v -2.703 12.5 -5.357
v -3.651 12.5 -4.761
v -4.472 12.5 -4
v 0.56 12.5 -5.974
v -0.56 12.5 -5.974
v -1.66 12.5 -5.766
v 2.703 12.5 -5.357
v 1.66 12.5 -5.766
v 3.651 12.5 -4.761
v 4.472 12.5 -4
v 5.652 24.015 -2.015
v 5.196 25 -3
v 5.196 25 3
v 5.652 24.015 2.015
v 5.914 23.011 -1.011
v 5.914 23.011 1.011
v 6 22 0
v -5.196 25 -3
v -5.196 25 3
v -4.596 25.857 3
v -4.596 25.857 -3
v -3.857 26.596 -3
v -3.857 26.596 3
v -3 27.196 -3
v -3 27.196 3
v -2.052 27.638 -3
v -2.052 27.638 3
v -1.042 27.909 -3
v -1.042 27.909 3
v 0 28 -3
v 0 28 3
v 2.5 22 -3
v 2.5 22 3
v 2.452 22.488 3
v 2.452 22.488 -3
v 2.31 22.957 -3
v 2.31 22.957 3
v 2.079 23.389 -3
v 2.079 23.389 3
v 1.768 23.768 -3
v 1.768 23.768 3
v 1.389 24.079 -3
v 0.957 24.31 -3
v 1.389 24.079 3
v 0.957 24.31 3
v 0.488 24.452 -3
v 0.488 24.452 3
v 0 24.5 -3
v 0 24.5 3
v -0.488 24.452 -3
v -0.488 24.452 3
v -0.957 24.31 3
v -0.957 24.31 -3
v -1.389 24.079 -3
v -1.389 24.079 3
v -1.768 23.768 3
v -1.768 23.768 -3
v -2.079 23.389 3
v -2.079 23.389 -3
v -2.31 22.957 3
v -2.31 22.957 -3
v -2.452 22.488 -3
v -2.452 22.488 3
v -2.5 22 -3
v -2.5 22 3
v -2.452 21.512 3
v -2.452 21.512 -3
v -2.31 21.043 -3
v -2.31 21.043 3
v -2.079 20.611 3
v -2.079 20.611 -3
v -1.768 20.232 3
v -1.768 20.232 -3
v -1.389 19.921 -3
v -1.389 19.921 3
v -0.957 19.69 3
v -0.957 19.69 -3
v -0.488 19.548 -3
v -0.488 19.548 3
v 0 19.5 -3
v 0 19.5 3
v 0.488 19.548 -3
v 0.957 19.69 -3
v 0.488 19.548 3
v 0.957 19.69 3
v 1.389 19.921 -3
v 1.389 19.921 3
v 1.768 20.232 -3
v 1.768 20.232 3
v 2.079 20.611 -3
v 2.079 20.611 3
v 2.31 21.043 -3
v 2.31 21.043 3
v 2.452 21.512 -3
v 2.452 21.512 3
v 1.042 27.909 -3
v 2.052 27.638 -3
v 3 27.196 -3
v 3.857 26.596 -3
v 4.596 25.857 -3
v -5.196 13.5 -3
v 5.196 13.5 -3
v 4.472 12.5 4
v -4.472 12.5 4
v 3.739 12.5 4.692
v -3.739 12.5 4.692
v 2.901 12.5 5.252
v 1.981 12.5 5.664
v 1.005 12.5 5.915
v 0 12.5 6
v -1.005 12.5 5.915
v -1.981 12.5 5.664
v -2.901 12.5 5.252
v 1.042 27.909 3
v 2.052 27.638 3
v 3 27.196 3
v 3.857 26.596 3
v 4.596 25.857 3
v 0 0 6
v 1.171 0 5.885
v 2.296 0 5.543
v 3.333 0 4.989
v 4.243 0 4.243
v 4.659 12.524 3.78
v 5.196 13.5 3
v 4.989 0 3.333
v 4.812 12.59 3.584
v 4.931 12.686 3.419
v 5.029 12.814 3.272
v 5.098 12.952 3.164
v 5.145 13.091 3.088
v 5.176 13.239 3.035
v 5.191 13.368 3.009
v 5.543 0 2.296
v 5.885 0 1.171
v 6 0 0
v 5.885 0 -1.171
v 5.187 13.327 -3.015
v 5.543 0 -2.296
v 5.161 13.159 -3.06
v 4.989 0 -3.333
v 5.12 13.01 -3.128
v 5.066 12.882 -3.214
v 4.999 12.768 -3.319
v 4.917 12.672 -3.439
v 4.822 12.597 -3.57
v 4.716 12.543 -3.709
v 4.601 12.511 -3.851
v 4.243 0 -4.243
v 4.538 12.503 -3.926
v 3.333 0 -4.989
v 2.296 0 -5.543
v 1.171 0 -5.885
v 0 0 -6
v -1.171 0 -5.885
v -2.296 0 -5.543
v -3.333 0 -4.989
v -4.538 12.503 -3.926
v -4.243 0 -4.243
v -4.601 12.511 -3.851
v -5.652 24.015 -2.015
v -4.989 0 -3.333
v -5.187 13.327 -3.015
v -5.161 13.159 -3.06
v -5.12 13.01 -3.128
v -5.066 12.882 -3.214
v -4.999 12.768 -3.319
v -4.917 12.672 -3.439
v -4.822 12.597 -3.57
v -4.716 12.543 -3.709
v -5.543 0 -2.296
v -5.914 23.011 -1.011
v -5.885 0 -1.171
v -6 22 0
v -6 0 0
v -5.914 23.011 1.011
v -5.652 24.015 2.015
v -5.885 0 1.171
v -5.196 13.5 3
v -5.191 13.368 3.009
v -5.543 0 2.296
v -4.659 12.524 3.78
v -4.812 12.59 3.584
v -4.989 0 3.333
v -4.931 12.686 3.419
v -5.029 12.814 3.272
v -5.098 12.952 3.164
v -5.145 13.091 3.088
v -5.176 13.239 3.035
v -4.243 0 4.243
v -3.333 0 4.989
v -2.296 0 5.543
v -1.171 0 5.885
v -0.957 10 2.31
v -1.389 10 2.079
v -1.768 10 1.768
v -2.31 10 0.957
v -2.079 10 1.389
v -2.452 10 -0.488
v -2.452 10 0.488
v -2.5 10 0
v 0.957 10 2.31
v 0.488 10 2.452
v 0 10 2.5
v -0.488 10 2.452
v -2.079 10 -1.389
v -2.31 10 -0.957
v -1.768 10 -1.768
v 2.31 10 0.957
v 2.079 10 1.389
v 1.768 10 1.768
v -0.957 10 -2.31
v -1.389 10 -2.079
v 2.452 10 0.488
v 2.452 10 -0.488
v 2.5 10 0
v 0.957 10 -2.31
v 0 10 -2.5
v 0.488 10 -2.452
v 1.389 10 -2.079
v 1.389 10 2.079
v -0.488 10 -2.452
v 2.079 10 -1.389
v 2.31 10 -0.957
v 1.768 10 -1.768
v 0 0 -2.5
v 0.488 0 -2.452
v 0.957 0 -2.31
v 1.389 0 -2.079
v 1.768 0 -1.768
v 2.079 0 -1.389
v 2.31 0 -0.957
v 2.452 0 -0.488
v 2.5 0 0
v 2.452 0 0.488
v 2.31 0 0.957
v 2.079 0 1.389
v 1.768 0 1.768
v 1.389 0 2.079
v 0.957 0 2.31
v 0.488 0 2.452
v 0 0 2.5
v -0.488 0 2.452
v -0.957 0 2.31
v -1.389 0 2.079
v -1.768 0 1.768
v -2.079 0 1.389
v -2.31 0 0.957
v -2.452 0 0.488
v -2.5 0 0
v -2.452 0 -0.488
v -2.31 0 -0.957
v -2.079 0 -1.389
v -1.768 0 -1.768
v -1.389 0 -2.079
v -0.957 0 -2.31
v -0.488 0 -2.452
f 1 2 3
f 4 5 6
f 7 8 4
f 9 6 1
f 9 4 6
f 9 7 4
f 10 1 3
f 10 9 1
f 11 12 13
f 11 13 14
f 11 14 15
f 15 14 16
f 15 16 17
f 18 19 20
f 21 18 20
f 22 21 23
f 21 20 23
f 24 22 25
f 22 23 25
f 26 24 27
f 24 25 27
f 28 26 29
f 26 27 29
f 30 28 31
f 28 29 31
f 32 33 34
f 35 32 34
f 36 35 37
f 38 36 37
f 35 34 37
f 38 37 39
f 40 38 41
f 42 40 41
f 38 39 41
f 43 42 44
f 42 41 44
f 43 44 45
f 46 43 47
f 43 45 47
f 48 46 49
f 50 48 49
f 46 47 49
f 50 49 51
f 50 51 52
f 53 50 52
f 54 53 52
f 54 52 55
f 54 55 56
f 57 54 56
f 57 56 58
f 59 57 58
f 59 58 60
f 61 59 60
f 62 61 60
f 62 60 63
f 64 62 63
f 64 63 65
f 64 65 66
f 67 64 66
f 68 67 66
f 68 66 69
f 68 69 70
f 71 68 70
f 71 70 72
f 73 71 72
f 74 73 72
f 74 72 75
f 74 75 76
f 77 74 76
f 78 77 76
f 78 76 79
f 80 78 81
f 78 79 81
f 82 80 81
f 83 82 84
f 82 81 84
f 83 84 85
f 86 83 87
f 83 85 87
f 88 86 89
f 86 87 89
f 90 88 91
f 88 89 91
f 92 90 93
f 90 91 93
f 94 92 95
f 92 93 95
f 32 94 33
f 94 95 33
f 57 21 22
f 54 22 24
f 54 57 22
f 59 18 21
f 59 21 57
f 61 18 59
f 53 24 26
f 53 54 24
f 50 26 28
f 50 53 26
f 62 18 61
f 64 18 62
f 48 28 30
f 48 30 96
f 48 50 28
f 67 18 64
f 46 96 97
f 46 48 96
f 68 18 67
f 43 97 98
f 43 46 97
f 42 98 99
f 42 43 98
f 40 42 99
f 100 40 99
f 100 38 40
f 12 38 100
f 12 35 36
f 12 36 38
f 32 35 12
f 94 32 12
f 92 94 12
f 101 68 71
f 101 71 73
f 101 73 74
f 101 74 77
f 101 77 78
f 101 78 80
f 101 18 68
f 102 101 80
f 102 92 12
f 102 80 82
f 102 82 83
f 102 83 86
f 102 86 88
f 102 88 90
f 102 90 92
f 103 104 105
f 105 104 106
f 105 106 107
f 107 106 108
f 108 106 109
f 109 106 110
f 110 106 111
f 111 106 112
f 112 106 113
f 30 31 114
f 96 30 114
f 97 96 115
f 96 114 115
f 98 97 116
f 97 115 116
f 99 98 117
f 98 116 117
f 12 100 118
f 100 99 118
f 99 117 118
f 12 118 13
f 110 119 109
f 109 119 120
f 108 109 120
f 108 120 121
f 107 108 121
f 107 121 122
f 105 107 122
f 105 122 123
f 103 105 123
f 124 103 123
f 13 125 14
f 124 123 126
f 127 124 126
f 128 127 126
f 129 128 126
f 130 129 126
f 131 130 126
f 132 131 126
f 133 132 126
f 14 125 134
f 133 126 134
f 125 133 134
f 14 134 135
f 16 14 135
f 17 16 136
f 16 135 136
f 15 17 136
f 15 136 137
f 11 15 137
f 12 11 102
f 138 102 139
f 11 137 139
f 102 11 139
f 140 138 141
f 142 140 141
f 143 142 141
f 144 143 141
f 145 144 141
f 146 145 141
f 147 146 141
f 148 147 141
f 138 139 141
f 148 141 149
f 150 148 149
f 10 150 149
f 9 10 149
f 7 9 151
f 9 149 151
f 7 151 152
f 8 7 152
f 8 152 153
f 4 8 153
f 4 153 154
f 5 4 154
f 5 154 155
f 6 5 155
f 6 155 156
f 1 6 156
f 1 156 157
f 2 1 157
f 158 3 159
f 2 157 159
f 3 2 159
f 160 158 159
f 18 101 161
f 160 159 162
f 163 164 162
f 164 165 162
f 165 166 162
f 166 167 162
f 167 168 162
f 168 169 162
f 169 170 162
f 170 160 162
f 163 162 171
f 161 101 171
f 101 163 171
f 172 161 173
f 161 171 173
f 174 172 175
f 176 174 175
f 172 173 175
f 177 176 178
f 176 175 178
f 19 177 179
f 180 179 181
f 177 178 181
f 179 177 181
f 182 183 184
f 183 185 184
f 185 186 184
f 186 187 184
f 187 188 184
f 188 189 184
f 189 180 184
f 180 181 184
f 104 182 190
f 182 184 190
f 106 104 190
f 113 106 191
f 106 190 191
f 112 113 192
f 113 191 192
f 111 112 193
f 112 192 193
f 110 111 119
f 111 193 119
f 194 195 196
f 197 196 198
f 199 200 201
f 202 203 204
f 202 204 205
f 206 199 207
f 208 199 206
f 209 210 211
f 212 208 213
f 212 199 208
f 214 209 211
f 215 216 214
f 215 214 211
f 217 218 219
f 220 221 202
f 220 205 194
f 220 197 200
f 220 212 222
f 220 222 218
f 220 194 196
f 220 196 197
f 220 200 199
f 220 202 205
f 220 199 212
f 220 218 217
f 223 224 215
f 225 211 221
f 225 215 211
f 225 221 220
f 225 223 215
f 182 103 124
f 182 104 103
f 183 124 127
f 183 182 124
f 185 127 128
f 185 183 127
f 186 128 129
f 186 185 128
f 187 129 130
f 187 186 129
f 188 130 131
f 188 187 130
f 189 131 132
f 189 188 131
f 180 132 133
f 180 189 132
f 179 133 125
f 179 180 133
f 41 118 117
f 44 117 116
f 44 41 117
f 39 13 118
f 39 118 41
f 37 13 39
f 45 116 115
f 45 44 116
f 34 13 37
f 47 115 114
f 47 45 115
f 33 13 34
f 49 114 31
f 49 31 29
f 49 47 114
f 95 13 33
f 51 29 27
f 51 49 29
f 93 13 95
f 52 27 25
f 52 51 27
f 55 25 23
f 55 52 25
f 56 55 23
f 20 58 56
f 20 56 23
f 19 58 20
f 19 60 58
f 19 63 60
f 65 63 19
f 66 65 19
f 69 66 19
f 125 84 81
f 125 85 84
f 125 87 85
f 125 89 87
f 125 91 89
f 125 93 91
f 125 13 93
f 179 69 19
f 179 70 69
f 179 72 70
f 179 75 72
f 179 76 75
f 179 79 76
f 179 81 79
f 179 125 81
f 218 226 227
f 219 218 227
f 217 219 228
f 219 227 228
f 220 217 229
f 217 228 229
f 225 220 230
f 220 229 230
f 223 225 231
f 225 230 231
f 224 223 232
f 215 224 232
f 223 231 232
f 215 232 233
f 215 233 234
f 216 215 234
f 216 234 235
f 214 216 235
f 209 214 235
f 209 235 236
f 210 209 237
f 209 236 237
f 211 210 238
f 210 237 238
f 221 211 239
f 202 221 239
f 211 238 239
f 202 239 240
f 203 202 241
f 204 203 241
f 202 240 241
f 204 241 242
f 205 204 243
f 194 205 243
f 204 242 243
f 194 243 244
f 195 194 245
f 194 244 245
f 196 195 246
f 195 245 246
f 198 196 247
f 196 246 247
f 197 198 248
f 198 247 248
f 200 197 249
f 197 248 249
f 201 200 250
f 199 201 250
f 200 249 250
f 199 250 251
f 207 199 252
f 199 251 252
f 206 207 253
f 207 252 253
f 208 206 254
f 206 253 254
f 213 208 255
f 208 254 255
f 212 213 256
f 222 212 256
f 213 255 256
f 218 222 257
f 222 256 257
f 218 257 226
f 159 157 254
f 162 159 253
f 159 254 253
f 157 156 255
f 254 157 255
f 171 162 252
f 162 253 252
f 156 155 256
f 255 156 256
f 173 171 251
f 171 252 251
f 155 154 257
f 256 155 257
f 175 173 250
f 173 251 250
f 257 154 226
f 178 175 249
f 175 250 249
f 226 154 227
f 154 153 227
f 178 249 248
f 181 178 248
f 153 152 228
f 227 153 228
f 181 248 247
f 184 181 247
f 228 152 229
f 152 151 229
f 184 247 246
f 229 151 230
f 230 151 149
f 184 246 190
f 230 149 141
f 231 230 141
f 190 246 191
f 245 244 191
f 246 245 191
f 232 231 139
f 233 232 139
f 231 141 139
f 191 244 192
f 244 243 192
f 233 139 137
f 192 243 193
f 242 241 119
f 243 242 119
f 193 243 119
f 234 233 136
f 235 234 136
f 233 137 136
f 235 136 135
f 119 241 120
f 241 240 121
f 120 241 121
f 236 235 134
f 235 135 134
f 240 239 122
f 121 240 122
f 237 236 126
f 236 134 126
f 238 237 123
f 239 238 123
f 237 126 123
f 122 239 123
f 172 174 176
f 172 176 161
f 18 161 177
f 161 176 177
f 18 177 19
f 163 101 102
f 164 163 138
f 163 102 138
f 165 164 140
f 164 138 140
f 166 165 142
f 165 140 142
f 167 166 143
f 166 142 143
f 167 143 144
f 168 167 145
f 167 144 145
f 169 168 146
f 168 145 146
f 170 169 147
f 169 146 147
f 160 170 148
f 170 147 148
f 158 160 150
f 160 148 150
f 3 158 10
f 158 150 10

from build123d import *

# Parameters (mm, degrees)
SKETCH1_R           = 6
BOSS_EXTRUDE1_DEPTH = 28
CUT_EXTRUDE1_START  = -15.5
CUT_EXTRUDE1_DEPTH  = 15.5
CUT_EXTRUDE2_DEPTH  = 31.01666204
SKETCH4_R           = 2.5
CUT_EXTRUDE3_DEPTH  = 31.01666204
FILLET1_R           = 1
CUT_EXTRUDE4_DEPTH  = 31.016662183
SKETCH7_R           = 2.5
CUT_EXTRUDE5_DEPTH  = 10


with BuildPart() as part:
    # Sketch1 → Boss-Extrude1 (new body)
    with BuildSketch(Plane(origin=(0, 0, 0), x_dir=(1, 0, 0), z_dir=(0, 1, 0))):
        with Locations(Location((0, 0, 0), (0, 0, 270))):
            Circle(SKETCH1_R)
    extrude(amount=BOSS_EXTRUDE1_DEPTH)

    # Sketch2 → Cut-Extrude1 (cut)
    with BuildSketch(Plane(origin=(0, 28, 0), x_dir=(1, 0, 0), z_dir=(0, 1, 0)).offset(CUT_EXTRUDE1_START)):
        with BuildLine():
            ThreePointArc((5.196152423, 3), (0, 6), (-5.196152423, 3))
            Line((-5.196152423, 3), (5.196152423, 3))
        make_face()
        with BuildLine():
            Line((5.196152423, -3), (-5.196152423, -3))
            ThreePointArc((-5.196152423, -3), (0, -6), (5.196152423, -3))
        make_face()
    extrude(amount=CUT_EXTRUDE1_DEPTH, mode=Mode.SUBTRACT)

    # Sketch3 → Cut-Extrude2 (cut, through all)
    with BuildSketch(Plane.XY.offset(3)):
        with BuildLine():
            ThreePointArc((-5.196152423, 25), (-3, 27.196152423), (0, 28))
            Line((0, 28), (-5.196152423, 28))
            Line((-5.196152423, 28), (-5.196152423, 25))
        make_face()
        with BuildLine():
            ThreePointArc((0, 28), (3, 27.196152423), (5.196152423, 25))
            Line((5.196152423, 25), (5.196152423, 28))
            Line((5.196152423, 28), (0, 28))
        make_face()
    extrude(amount=-CUT_EXTRUDE2_DEPTH, mode=Mode.SUBTRACT)

    # Sketch4 → Cut-Extrude3 (cut, through all)
    with BuildSketch(Plane.XY.offset(3)):
        with Locations((0, 22)):
            Circle(SKETCH4_R)
    extrude(amount=-CUT_EXTRUDE3_DEPTH, mode=Mode.SUBTRACT)

    # Fillet1
    fillet1_edges = [part.edges().sort_by_distance(p)[0] for p in [
        (0, 12.5, -3),
        (0, 12.5, 3),
    ]]
    fillet(fillet1_edges, radius=FILLET1_R)

    # Sketch6 → Cut-Extrude4 (cut, through all)
    with BuildSketch(Plane.XY.offset(3)):
        with BuildLine():
            Line((-6, 28), (-6, 22))
            ThreePointArc((-6, 22), (-5.795554958, 23.552914271), (-5.196152423, 25))
            ThreePointArc((-5.196152423, 25), (-3, 27.196152423), (0, 28))
            Line((0, 28), (-6, 28))
        make_face()
        with BuildLine():
            ThreePointArc((5.196152423, 25), (5.795554958, 23.552914271), (6, 22))
            Line((6, 22), (6, 28))
            Line((6, 28), (0, 28))
            ThreePointArc((0, 28), (3, 27.196152423), (5.196152423, 25))
        make_face()
    extrude(amount=-CUT_EXTRUDE4_DEPTH, mode=Mode.SUBTRACT)

    # Sketch7 → Cut-Extrude5 (cut)
    with BuildSketch(Plane.XZ):
        with Locations(Location((0, 0, 0), (0, 0, 270))):
            Circle(SKETCH7_R)
    extrude(amount=-CUT_EXTRUDE5_DEPTH, mode=Mode.SUBTRACT)


solid = part.part
